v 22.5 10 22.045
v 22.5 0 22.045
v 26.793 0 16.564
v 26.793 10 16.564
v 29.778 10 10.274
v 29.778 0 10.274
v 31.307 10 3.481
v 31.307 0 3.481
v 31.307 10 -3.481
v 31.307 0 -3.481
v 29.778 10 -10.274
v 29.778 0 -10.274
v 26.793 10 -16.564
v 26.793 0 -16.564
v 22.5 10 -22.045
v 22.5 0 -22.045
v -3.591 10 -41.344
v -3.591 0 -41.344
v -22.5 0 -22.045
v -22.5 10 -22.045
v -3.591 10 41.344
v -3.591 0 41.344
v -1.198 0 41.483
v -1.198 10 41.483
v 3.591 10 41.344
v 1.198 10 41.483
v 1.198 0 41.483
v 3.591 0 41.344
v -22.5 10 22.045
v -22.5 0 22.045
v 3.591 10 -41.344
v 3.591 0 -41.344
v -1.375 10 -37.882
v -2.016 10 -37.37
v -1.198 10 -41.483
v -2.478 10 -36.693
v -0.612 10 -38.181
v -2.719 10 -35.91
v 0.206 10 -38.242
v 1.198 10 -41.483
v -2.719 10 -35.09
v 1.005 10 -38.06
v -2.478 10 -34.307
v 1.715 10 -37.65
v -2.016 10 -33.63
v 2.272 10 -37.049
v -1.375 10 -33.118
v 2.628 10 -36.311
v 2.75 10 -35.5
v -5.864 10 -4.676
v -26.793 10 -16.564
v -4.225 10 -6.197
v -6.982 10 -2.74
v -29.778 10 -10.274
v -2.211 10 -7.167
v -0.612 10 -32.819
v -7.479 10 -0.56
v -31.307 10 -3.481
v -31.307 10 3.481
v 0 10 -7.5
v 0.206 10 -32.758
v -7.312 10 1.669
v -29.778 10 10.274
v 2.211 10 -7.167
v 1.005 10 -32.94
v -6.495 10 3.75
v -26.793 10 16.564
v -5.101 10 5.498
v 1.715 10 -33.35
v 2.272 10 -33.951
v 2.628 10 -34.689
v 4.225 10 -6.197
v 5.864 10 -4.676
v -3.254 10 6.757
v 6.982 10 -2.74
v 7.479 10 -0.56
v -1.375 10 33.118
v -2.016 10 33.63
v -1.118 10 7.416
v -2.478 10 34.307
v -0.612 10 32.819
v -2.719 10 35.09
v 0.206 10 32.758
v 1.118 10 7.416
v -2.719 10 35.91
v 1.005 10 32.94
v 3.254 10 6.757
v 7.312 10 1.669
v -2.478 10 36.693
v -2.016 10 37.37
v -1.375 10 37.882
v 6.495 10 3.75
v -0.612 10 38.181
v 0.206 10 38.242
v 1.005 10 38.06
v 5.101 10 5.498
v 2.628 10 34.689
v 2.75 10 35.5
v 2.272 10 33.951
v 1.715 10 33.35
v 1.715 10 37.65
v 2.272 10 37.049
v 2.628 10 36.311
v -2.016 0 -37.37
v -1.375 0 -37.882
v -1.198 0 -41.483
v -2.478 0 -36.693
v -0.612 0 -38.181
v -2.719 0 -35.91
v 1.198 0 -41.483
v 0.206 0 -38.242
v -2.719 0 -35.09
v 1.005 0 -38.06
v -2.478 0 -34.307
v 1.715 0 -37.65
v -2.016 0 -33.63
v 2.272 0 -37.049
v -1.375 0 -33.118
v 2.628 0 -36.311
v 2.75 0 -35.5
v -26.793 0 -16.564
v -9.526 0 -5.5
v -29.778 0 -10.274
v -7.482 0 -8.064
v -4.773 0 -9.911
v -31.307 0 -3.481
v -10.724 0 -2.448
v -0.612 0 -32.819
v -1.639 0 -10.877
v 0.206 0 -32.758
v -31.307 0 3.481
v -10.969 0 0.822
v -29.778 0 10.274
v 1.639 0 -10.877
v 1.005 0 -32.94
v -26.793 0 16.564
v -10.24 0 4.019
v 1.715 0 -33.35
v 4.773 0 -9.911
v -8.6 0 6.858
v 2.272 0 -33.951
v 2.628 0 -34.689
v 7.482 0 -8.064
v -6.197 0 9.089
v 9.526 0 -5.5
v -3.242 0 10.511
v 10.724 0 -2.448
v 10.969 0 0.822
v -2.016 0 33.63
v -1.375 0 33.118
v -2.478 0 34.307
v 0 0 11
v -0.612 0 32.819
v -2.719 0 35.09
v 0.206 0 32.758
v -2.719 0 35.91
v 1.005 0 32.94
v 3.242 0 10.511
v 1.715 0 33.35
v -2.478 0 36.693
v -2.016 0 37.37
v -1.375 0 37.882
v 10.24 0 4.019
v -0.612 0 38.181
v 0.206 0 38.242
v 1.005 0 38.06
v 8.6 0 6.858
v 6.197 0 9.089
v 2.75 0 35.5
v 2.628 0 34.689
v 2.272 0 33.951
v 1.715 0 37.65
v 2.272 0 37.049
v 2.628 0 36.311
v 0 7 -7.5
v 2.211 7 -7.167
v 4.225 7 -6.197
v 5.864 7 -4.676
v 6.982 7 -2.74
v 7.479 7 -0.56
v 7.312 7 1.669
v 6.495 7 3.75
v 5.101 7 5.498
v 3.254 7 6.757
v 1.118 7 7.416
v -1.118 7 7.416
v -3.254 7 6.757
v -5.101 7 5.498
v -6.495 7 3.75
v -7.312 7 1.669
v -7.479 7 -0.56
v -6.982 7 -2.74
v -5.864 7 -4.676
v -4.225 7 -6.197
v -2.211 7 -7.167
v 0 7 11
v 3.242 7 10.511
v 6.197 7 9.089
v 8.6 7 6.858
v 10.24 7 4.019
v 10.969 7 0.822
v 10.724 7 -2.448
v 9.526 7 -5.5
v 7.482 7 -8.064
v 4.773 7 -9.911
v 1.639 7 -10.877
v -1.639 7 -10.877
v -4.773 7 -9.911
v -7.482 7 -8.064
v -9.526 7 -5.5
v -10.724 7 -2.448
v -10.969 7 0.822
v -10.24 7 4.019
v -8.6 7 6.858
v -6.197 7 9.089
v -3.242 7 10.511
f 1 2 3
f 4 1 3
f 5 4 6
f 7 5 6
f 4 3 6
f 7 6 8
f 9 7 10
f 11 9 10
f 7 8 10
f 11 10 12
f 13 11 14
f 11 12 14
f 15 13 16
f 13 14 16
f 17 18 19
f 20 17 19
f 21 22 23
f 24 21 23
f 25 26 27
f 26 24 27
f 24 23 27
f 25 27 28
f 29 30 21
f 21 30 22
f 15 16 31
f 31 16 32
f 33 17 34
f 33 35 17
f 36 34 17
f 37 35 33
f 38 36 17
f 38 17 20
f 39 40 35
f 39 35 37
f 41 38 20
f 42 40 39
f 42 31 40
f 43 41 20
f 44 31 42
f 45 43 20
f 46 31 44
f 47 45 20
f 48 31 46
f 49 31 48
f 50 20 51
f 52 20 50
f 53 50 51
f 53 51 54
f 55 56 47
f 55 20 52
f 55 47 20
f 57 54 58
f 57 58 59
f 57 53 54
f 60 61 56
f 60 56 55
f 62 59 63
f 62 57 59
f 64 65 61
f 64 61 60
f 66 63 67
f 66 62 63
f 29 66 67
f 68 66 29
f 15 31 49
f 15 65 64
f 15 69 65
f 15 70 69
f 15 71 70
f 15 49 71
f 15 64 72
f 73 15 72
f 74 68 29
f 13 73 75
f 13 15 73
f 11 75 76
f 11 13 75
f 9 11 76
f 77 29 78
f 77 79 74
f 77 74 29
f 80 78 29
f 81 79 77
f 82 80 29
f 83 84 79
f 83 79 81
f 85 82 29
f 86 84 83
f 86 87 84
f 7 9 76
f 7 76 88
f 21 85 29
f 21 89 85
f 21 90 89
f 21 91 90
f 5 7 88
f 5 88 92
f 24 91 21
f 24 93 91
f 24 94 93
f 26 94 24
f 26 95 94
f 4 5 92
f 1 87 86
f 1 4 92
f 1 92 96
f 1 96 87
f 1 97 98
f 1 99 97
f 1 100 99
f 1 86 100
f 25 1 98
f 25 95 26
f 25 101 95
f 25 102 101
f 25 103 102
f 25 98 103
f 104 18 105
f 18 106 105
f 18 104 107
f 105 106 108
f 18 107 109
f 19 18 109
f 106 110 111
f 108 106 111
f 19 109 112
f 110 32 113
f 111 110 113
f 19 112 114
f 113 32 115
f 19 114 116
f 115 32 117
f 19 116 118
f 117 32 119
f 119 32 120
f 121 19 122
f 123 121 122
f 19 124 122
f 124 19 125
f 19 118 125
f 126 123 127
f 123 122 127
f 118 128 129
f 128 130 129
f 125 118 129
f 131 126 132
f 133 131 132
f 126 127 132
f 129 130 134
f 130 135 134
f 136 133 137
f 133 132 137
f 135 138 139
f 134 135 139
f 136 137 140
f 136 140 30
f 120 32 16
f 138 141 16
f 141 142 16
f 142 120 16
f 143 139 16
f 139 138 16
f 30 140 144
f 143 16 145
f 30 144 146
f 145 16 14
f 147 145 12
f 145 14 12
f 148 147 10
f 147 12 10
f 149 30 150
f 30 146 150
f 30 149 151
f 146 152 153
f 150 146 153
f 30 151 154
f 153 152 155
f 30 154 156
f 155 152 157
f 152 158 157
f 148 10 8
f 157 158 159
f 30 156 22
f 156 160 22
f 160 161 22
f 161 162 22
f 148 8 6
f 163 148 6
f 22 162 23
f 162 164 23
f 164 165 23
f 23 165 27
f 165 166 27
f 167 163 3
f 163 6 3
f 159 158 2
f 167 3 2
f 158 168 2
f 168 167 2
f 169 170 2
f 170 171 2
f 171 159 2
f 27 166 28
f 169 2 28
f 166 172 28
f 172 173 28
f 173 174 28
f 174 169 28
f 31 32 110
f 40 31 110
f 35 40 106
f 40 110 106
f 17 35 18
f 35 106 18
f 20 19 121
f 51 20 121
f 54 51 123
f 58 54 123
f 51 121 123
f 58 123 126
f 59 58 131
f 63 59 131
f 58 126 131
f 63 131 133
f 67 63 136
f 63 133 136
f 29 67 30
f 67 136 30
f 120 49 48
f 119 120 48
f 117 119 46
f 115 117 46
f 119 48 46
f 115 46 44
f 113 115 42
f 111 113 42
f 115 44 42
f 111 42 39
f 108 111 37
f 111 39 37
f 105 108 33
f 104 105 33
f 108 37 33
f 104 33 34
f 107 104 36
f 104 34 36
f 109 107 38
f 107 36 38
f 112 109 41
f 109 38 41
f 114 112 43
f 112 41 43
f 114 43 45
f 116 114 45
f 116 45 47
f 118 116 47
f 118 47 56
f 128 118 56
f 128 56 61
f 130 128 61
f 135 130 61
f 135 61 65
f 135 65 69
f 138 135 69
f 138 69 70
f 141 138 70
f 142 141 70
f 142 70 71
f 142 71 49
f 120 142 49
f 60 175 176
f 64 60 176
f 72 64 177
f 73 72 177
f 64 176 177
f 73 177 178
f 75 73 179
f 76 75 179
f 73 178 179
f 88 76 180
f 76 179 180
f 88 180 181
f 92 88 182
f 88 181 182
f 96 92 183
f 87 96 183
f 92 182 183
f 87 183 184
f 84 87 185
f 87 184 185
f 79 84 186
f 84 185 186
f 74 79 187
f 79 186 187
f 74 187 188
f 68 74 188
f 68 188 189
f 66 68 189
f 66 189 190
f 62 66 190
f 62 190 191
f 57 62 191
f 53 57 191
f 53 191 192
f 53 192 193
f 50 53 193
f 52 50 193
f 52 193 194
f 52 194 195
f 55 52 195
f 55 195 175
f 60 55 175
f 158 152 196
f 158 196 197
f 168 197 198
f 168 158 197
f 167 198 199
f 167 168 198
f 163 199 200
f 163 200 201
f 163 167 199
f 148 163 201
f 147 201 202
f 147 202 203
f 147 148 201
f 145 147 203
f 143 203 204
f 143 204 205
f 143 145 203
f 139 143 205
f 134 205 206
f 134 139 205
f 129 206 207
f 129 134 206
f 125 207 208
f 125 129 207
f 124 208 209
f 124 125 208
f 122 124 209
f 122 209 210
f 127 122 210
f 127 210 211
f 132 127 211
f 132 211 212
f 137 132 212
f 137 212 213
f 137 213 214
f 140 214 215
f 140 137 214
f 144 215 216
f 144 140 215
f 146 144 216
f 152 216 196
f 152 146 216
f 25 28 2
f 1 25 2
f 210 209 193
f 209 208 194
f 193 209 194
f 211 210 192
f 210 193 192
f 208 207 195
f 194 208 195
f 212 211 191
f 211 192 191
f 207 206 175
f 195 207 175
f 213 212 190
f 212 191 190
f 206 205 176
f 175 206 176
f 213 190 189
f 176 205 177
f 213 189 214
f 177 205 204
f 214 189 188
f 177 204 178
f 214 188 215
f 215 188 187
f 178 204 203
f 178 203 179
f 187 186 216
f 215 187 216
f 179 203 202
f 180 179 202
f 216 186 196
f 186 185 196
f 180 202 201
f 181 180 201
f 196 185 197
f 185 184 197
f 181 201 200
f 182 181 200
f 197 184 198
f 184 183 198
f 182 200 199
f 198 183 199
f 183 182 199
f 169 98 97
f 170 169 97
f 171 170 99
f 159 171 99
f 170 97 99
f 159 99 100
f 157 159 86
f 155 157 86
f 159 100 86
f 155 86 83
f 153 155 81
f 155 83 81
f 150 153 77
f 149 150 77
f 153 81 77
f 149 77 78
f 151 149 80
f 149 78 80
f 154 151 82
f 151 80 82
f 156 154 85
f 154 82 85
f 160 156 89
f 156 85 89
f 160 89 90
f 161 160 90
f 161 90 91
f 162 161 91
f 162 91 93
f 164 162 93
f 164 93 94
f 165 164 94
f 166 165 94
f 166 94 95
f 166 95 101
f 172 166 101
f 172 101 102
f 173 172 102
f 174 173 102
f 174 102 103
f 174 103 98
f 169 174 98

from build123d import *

# Parameters (mm, degrees)
SKETCH1_R            = 41.5
BOSS_EXTRUDE1_DEPTH  = 10
SKETCH2_OUTSIDE_W    = 108.56
SKETCH2_OUTSIDE_H    = 108.56
CUT_EXTRUDE1_DEPTH   = 10
SKETCH3_R            = 11
CUT_EXTRUDE2_DEPTH   = 7
CUT_EXTRUDE3_REACH   = 54.569
SKETCH4_R            = 7.5
M5_CLEARANCE_HOLE1_D = 5.5


with BuildPart() as part:
    # Sketch1 → Boss-Extrude1 (new body)
    with BuildSketch(Plane(origin=(0, 0, 0), x_dir=(1, 0, 0), z_dir=(0, 1, 0))):
        with Locations(Location((0, 0, 0), (0, 0, 270))):
            Circle(SKETCH1_R)
    extrude(amount=BOSS_EXTRUDE1_DEPTH)

    # Sketch2 outside → Cut-Extrude1 (cut)
    with BuildSketch(Plane.XZ):
        Rectangle(SKETCH2_OUTSIDE_W, SKETCH2_OUTSIDE_H)
        with BuildLine():
            Line((-22.5, 22.045407685), (-3.590980448, 41.344344951))
            ThreePointArc((-3.590980448, 41.344344951), (0, 41.5), (3.590980448, 41.344344951))
            Line((3.590980448, 41.344344951), (22.5, 22.045407685))
            ThreePointArc((22.5, 22.045407685), (31.5, 0), (22.5, -22.045407685))
            Line((22.5, -22.045407685), (3.590980448, -41.344344951))
            ThreePointArc((3.590980448, -41.344344951), (0, -41.5), (-3.590980448, -41.344344951))
            Line((-3.590980448, -41.344344951), (-22.5, -22.045407685))
            ThreePointArc((-22.5, -22.045407685), (-31.5, 0), (-22.5, 22.045407685))
        make_face(mode=Mode.SUBTRACT)
    extrude(amount=-CUT_EXTRUDE1_DEPTH, mode=Mode.SUBTRACT)

    # Sketch3 → Cut-Extrude2 (cut)
    with BuildSketch(Plane(origin=(0, 0, 0), x_dir=(1, 0, 0), z_dir=(0, 1, 0))):
        with Locations(Location((0, 0, 0), (0, 0, 270))):
            Circle(SKETCH3_R)
    extrude(amount=CUT_EXTRUDE2_DEPTH, mode=Mode.SUBTRACT)

    # Sketch4 → Cut-Extrude3 (cut, up to next)
    with BuildSketch(Plane.XZ.offset(-7), mode=Mode.PRIVATE) as cut_extrude3_sk1:
        with Locations(Location((0, 0, 0), (0, 0, 270))):
            Circle(SKETCH4_R)
    cut_extrude3_tool1 = extrude(cut_extrude3_sk1.sketch, amount=-CUT_EXTRUDE3_REACH, mode=Mode.PRIVATE) & part.part
    add(cut_extrude3_tool1.solids().sort_by_distance((0, 7, 0))[0], mode=Mode.SUBTRACT)

    # M5 Clearance Hole1 (through all)
    with Locations(Plane(origin=(0, 0, 0), x_dir=(-1, 0, 0), z_dir=(0, -1, 0))):
        with Locations((0, 35.5), (0, -35.5)):
            Hole(M5_CLEARANCE_HOLE1_D / 2)


solid = part.part
